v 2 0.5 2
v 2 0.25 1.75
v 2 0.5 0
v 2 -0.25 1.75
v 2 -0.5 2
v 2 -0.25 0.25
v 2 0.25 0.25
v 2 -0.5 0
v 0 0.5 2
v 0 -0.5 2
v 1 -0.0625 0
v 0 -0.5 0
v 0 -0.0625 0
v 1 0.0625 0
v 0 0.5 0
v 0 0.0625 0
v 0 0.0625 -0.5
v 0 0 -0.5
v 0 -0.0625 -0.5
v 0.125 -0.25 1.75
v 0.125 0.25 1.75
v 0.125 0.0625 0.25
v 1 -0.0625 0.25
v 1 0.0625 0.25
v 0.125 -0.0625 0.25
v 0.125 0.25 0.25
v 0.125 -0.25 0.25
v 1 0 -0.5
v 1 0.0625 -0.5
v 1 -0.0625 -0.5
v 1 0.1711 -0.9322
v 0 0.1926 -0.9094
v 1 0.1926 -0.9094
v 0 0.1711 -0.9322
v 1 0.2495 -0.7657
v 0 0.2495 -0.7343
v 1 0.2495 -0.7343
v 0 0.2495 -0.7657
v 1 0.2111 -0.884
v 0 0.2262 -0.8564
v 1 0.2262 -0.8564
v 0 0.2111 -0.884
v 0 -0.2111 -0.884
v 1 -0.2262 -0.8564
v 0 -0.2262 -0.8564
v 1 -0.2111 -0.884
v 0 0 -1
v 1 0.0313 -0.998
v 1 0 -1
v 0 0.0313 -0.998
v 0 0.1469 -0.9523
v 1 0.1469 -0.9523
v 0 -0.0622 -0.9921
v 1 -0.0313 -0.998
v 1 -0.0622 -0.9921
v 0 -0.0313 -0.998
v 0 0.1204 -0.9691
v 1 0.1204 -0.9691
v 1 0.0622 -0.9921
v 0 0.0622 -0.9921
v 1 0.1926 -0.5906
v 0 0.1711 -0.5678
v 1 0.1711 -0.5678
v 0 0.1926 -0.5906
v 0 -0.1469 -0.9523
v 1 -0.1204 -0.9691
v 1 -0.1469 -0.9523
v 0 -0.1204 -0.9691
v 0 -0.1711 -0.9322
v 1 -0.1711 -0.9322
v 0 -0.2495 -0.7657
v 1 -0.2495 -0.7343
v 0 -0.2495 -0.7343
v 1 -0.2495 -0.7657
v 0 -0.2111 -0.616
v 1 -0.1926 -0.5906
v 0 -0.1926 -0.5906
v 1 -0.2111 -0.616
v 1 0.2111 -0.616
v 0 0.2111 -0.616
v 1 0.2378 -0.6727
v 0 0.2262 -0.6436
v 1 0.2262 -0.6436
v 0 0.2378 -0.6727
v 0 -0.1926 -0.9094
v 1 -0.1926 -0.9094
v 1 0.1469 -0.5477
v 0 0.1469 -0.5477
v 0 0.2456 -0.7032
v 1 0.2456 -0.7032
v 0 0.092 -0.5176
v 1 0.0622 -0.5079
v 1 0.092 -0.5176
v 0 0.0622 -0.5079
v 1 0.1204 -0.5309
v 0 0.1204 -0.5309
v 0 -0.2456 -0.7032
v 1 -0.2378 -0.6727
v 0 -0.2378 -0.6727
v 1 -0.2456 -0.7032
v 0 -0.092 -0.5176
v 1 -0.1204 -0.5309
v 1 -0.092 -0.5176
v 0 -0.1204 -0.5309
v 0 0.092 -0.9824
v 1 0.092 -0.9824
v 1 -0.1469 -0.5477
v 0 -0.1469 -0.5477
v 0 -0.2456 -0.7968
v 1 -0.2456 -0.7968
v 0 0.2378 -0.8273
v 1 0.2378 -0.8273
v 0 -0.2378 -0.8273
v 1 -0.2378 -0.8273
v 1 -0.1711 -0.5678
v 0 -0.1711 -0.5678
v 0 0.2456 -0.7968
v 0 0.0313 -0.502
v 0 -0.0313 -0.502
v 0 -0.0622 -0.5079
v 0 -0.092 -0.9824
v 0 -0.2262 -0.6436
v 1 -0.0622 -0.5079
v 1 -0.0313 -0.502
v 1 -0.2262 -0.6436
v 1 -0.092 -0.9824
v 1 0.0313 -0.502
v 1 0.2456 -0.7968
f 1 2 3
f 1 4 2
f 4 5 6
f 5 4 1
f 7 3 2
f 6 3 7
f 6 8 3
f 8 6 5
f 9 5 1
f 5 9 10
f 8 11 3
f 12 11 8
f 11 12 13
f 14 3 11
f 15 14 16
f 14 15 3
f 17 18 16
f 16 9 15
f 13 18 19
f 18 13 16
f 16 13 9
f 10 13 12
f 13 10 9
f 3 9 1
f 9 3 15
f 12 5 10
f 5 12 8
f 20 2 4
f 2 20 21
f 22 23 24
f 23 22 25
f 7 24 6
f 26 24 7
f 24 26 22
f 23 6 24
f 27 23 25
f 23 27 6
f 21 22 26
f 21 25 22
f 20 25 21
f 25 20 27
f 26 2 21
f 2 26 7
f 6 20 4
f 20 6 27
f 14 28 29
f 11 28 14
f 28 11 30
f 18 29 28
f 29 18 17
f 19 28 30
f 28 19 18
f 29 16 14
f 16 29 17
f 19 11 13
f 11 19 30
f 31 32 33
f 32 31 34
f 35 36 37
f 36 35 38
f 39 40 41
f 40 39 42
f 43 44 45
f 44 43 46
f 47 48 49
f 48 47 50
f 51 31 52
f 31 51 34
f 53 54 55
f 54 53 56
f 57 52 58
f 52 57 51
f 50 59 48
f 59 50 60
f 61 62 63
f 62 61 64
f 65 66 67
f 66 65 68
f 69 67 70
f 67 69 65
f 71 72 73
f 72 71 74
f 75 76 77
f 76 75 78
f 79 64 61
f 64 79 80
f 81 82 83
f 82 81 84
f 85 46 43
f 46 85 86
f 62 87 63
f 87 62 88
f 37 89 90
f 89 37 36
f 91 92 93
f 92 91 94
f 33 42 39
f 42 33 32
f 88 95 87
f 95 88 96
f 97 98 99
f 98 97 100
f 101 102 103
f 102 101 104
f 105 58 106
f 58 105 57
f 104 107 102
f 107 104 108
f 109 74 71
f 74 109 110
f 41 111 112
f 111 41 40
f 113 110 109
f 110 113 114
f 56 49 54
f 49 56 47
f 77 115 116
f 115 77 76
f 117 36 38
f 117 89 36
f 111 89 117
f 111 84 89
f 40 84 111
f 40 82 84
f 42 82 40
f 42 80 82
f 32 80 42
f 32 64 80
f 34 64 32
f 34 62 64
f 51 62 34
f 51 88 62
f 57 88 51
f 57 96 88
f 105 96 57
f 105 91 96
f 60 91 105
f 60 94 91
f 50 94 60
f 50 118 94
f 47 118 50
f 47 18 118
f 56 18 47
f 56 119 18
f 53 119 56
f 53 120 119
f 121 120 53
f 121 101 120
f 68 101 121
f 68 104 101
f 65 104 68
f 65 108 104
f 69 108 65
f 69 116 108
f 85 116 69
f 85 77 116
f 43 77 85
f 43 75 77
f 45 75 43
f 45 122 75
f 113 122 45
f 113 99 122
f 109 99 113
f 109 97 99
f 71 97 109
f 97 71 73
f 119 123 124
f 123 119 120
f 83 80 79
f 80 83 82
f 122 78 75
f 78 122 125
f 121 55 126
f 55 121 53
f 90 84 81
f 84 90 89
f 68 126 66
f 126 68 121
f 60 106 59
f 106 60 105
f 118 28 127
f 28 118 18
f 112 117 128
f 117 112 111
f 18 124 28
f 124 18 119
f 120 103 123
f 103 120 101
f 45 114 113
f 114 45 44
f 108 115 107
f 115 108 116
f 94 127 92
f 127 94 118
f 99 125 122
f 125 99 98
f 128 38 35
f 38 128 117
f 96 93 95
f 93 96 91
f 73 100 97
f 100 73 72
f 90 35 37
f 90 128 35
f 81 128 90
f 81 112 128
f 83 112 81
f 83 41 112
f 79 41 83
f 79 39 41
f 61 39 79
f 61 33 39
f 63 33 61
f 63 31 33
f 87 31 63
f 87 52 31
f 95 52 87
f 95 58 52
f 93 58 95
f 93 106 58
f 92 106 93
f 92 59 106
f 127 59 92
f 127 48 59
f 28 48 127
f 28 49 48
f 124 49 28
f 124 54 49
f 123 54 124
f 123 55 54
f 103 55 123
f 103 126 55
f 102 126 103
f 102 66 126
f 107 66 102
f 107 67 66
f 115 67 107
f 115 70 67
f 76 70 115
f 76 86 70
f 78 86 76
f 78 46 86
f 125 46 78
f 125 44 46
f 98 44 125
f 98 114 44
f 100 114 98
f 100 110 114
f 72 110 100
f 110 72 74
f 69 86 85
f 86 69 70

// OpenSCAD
$fn=50;

difference() {
translate([0,-0.5,0])
cube([2,1,2]);
translate([1/8,-0.25,1/4])
cube([4,1/2,1.5]);
}
translate([0,-1/16,-0.5])
cube([1,1/8,3/4]);

translate([0,0,-0.75])
rotate([0,90,0])
cylinder(r=1/4, h=1);
